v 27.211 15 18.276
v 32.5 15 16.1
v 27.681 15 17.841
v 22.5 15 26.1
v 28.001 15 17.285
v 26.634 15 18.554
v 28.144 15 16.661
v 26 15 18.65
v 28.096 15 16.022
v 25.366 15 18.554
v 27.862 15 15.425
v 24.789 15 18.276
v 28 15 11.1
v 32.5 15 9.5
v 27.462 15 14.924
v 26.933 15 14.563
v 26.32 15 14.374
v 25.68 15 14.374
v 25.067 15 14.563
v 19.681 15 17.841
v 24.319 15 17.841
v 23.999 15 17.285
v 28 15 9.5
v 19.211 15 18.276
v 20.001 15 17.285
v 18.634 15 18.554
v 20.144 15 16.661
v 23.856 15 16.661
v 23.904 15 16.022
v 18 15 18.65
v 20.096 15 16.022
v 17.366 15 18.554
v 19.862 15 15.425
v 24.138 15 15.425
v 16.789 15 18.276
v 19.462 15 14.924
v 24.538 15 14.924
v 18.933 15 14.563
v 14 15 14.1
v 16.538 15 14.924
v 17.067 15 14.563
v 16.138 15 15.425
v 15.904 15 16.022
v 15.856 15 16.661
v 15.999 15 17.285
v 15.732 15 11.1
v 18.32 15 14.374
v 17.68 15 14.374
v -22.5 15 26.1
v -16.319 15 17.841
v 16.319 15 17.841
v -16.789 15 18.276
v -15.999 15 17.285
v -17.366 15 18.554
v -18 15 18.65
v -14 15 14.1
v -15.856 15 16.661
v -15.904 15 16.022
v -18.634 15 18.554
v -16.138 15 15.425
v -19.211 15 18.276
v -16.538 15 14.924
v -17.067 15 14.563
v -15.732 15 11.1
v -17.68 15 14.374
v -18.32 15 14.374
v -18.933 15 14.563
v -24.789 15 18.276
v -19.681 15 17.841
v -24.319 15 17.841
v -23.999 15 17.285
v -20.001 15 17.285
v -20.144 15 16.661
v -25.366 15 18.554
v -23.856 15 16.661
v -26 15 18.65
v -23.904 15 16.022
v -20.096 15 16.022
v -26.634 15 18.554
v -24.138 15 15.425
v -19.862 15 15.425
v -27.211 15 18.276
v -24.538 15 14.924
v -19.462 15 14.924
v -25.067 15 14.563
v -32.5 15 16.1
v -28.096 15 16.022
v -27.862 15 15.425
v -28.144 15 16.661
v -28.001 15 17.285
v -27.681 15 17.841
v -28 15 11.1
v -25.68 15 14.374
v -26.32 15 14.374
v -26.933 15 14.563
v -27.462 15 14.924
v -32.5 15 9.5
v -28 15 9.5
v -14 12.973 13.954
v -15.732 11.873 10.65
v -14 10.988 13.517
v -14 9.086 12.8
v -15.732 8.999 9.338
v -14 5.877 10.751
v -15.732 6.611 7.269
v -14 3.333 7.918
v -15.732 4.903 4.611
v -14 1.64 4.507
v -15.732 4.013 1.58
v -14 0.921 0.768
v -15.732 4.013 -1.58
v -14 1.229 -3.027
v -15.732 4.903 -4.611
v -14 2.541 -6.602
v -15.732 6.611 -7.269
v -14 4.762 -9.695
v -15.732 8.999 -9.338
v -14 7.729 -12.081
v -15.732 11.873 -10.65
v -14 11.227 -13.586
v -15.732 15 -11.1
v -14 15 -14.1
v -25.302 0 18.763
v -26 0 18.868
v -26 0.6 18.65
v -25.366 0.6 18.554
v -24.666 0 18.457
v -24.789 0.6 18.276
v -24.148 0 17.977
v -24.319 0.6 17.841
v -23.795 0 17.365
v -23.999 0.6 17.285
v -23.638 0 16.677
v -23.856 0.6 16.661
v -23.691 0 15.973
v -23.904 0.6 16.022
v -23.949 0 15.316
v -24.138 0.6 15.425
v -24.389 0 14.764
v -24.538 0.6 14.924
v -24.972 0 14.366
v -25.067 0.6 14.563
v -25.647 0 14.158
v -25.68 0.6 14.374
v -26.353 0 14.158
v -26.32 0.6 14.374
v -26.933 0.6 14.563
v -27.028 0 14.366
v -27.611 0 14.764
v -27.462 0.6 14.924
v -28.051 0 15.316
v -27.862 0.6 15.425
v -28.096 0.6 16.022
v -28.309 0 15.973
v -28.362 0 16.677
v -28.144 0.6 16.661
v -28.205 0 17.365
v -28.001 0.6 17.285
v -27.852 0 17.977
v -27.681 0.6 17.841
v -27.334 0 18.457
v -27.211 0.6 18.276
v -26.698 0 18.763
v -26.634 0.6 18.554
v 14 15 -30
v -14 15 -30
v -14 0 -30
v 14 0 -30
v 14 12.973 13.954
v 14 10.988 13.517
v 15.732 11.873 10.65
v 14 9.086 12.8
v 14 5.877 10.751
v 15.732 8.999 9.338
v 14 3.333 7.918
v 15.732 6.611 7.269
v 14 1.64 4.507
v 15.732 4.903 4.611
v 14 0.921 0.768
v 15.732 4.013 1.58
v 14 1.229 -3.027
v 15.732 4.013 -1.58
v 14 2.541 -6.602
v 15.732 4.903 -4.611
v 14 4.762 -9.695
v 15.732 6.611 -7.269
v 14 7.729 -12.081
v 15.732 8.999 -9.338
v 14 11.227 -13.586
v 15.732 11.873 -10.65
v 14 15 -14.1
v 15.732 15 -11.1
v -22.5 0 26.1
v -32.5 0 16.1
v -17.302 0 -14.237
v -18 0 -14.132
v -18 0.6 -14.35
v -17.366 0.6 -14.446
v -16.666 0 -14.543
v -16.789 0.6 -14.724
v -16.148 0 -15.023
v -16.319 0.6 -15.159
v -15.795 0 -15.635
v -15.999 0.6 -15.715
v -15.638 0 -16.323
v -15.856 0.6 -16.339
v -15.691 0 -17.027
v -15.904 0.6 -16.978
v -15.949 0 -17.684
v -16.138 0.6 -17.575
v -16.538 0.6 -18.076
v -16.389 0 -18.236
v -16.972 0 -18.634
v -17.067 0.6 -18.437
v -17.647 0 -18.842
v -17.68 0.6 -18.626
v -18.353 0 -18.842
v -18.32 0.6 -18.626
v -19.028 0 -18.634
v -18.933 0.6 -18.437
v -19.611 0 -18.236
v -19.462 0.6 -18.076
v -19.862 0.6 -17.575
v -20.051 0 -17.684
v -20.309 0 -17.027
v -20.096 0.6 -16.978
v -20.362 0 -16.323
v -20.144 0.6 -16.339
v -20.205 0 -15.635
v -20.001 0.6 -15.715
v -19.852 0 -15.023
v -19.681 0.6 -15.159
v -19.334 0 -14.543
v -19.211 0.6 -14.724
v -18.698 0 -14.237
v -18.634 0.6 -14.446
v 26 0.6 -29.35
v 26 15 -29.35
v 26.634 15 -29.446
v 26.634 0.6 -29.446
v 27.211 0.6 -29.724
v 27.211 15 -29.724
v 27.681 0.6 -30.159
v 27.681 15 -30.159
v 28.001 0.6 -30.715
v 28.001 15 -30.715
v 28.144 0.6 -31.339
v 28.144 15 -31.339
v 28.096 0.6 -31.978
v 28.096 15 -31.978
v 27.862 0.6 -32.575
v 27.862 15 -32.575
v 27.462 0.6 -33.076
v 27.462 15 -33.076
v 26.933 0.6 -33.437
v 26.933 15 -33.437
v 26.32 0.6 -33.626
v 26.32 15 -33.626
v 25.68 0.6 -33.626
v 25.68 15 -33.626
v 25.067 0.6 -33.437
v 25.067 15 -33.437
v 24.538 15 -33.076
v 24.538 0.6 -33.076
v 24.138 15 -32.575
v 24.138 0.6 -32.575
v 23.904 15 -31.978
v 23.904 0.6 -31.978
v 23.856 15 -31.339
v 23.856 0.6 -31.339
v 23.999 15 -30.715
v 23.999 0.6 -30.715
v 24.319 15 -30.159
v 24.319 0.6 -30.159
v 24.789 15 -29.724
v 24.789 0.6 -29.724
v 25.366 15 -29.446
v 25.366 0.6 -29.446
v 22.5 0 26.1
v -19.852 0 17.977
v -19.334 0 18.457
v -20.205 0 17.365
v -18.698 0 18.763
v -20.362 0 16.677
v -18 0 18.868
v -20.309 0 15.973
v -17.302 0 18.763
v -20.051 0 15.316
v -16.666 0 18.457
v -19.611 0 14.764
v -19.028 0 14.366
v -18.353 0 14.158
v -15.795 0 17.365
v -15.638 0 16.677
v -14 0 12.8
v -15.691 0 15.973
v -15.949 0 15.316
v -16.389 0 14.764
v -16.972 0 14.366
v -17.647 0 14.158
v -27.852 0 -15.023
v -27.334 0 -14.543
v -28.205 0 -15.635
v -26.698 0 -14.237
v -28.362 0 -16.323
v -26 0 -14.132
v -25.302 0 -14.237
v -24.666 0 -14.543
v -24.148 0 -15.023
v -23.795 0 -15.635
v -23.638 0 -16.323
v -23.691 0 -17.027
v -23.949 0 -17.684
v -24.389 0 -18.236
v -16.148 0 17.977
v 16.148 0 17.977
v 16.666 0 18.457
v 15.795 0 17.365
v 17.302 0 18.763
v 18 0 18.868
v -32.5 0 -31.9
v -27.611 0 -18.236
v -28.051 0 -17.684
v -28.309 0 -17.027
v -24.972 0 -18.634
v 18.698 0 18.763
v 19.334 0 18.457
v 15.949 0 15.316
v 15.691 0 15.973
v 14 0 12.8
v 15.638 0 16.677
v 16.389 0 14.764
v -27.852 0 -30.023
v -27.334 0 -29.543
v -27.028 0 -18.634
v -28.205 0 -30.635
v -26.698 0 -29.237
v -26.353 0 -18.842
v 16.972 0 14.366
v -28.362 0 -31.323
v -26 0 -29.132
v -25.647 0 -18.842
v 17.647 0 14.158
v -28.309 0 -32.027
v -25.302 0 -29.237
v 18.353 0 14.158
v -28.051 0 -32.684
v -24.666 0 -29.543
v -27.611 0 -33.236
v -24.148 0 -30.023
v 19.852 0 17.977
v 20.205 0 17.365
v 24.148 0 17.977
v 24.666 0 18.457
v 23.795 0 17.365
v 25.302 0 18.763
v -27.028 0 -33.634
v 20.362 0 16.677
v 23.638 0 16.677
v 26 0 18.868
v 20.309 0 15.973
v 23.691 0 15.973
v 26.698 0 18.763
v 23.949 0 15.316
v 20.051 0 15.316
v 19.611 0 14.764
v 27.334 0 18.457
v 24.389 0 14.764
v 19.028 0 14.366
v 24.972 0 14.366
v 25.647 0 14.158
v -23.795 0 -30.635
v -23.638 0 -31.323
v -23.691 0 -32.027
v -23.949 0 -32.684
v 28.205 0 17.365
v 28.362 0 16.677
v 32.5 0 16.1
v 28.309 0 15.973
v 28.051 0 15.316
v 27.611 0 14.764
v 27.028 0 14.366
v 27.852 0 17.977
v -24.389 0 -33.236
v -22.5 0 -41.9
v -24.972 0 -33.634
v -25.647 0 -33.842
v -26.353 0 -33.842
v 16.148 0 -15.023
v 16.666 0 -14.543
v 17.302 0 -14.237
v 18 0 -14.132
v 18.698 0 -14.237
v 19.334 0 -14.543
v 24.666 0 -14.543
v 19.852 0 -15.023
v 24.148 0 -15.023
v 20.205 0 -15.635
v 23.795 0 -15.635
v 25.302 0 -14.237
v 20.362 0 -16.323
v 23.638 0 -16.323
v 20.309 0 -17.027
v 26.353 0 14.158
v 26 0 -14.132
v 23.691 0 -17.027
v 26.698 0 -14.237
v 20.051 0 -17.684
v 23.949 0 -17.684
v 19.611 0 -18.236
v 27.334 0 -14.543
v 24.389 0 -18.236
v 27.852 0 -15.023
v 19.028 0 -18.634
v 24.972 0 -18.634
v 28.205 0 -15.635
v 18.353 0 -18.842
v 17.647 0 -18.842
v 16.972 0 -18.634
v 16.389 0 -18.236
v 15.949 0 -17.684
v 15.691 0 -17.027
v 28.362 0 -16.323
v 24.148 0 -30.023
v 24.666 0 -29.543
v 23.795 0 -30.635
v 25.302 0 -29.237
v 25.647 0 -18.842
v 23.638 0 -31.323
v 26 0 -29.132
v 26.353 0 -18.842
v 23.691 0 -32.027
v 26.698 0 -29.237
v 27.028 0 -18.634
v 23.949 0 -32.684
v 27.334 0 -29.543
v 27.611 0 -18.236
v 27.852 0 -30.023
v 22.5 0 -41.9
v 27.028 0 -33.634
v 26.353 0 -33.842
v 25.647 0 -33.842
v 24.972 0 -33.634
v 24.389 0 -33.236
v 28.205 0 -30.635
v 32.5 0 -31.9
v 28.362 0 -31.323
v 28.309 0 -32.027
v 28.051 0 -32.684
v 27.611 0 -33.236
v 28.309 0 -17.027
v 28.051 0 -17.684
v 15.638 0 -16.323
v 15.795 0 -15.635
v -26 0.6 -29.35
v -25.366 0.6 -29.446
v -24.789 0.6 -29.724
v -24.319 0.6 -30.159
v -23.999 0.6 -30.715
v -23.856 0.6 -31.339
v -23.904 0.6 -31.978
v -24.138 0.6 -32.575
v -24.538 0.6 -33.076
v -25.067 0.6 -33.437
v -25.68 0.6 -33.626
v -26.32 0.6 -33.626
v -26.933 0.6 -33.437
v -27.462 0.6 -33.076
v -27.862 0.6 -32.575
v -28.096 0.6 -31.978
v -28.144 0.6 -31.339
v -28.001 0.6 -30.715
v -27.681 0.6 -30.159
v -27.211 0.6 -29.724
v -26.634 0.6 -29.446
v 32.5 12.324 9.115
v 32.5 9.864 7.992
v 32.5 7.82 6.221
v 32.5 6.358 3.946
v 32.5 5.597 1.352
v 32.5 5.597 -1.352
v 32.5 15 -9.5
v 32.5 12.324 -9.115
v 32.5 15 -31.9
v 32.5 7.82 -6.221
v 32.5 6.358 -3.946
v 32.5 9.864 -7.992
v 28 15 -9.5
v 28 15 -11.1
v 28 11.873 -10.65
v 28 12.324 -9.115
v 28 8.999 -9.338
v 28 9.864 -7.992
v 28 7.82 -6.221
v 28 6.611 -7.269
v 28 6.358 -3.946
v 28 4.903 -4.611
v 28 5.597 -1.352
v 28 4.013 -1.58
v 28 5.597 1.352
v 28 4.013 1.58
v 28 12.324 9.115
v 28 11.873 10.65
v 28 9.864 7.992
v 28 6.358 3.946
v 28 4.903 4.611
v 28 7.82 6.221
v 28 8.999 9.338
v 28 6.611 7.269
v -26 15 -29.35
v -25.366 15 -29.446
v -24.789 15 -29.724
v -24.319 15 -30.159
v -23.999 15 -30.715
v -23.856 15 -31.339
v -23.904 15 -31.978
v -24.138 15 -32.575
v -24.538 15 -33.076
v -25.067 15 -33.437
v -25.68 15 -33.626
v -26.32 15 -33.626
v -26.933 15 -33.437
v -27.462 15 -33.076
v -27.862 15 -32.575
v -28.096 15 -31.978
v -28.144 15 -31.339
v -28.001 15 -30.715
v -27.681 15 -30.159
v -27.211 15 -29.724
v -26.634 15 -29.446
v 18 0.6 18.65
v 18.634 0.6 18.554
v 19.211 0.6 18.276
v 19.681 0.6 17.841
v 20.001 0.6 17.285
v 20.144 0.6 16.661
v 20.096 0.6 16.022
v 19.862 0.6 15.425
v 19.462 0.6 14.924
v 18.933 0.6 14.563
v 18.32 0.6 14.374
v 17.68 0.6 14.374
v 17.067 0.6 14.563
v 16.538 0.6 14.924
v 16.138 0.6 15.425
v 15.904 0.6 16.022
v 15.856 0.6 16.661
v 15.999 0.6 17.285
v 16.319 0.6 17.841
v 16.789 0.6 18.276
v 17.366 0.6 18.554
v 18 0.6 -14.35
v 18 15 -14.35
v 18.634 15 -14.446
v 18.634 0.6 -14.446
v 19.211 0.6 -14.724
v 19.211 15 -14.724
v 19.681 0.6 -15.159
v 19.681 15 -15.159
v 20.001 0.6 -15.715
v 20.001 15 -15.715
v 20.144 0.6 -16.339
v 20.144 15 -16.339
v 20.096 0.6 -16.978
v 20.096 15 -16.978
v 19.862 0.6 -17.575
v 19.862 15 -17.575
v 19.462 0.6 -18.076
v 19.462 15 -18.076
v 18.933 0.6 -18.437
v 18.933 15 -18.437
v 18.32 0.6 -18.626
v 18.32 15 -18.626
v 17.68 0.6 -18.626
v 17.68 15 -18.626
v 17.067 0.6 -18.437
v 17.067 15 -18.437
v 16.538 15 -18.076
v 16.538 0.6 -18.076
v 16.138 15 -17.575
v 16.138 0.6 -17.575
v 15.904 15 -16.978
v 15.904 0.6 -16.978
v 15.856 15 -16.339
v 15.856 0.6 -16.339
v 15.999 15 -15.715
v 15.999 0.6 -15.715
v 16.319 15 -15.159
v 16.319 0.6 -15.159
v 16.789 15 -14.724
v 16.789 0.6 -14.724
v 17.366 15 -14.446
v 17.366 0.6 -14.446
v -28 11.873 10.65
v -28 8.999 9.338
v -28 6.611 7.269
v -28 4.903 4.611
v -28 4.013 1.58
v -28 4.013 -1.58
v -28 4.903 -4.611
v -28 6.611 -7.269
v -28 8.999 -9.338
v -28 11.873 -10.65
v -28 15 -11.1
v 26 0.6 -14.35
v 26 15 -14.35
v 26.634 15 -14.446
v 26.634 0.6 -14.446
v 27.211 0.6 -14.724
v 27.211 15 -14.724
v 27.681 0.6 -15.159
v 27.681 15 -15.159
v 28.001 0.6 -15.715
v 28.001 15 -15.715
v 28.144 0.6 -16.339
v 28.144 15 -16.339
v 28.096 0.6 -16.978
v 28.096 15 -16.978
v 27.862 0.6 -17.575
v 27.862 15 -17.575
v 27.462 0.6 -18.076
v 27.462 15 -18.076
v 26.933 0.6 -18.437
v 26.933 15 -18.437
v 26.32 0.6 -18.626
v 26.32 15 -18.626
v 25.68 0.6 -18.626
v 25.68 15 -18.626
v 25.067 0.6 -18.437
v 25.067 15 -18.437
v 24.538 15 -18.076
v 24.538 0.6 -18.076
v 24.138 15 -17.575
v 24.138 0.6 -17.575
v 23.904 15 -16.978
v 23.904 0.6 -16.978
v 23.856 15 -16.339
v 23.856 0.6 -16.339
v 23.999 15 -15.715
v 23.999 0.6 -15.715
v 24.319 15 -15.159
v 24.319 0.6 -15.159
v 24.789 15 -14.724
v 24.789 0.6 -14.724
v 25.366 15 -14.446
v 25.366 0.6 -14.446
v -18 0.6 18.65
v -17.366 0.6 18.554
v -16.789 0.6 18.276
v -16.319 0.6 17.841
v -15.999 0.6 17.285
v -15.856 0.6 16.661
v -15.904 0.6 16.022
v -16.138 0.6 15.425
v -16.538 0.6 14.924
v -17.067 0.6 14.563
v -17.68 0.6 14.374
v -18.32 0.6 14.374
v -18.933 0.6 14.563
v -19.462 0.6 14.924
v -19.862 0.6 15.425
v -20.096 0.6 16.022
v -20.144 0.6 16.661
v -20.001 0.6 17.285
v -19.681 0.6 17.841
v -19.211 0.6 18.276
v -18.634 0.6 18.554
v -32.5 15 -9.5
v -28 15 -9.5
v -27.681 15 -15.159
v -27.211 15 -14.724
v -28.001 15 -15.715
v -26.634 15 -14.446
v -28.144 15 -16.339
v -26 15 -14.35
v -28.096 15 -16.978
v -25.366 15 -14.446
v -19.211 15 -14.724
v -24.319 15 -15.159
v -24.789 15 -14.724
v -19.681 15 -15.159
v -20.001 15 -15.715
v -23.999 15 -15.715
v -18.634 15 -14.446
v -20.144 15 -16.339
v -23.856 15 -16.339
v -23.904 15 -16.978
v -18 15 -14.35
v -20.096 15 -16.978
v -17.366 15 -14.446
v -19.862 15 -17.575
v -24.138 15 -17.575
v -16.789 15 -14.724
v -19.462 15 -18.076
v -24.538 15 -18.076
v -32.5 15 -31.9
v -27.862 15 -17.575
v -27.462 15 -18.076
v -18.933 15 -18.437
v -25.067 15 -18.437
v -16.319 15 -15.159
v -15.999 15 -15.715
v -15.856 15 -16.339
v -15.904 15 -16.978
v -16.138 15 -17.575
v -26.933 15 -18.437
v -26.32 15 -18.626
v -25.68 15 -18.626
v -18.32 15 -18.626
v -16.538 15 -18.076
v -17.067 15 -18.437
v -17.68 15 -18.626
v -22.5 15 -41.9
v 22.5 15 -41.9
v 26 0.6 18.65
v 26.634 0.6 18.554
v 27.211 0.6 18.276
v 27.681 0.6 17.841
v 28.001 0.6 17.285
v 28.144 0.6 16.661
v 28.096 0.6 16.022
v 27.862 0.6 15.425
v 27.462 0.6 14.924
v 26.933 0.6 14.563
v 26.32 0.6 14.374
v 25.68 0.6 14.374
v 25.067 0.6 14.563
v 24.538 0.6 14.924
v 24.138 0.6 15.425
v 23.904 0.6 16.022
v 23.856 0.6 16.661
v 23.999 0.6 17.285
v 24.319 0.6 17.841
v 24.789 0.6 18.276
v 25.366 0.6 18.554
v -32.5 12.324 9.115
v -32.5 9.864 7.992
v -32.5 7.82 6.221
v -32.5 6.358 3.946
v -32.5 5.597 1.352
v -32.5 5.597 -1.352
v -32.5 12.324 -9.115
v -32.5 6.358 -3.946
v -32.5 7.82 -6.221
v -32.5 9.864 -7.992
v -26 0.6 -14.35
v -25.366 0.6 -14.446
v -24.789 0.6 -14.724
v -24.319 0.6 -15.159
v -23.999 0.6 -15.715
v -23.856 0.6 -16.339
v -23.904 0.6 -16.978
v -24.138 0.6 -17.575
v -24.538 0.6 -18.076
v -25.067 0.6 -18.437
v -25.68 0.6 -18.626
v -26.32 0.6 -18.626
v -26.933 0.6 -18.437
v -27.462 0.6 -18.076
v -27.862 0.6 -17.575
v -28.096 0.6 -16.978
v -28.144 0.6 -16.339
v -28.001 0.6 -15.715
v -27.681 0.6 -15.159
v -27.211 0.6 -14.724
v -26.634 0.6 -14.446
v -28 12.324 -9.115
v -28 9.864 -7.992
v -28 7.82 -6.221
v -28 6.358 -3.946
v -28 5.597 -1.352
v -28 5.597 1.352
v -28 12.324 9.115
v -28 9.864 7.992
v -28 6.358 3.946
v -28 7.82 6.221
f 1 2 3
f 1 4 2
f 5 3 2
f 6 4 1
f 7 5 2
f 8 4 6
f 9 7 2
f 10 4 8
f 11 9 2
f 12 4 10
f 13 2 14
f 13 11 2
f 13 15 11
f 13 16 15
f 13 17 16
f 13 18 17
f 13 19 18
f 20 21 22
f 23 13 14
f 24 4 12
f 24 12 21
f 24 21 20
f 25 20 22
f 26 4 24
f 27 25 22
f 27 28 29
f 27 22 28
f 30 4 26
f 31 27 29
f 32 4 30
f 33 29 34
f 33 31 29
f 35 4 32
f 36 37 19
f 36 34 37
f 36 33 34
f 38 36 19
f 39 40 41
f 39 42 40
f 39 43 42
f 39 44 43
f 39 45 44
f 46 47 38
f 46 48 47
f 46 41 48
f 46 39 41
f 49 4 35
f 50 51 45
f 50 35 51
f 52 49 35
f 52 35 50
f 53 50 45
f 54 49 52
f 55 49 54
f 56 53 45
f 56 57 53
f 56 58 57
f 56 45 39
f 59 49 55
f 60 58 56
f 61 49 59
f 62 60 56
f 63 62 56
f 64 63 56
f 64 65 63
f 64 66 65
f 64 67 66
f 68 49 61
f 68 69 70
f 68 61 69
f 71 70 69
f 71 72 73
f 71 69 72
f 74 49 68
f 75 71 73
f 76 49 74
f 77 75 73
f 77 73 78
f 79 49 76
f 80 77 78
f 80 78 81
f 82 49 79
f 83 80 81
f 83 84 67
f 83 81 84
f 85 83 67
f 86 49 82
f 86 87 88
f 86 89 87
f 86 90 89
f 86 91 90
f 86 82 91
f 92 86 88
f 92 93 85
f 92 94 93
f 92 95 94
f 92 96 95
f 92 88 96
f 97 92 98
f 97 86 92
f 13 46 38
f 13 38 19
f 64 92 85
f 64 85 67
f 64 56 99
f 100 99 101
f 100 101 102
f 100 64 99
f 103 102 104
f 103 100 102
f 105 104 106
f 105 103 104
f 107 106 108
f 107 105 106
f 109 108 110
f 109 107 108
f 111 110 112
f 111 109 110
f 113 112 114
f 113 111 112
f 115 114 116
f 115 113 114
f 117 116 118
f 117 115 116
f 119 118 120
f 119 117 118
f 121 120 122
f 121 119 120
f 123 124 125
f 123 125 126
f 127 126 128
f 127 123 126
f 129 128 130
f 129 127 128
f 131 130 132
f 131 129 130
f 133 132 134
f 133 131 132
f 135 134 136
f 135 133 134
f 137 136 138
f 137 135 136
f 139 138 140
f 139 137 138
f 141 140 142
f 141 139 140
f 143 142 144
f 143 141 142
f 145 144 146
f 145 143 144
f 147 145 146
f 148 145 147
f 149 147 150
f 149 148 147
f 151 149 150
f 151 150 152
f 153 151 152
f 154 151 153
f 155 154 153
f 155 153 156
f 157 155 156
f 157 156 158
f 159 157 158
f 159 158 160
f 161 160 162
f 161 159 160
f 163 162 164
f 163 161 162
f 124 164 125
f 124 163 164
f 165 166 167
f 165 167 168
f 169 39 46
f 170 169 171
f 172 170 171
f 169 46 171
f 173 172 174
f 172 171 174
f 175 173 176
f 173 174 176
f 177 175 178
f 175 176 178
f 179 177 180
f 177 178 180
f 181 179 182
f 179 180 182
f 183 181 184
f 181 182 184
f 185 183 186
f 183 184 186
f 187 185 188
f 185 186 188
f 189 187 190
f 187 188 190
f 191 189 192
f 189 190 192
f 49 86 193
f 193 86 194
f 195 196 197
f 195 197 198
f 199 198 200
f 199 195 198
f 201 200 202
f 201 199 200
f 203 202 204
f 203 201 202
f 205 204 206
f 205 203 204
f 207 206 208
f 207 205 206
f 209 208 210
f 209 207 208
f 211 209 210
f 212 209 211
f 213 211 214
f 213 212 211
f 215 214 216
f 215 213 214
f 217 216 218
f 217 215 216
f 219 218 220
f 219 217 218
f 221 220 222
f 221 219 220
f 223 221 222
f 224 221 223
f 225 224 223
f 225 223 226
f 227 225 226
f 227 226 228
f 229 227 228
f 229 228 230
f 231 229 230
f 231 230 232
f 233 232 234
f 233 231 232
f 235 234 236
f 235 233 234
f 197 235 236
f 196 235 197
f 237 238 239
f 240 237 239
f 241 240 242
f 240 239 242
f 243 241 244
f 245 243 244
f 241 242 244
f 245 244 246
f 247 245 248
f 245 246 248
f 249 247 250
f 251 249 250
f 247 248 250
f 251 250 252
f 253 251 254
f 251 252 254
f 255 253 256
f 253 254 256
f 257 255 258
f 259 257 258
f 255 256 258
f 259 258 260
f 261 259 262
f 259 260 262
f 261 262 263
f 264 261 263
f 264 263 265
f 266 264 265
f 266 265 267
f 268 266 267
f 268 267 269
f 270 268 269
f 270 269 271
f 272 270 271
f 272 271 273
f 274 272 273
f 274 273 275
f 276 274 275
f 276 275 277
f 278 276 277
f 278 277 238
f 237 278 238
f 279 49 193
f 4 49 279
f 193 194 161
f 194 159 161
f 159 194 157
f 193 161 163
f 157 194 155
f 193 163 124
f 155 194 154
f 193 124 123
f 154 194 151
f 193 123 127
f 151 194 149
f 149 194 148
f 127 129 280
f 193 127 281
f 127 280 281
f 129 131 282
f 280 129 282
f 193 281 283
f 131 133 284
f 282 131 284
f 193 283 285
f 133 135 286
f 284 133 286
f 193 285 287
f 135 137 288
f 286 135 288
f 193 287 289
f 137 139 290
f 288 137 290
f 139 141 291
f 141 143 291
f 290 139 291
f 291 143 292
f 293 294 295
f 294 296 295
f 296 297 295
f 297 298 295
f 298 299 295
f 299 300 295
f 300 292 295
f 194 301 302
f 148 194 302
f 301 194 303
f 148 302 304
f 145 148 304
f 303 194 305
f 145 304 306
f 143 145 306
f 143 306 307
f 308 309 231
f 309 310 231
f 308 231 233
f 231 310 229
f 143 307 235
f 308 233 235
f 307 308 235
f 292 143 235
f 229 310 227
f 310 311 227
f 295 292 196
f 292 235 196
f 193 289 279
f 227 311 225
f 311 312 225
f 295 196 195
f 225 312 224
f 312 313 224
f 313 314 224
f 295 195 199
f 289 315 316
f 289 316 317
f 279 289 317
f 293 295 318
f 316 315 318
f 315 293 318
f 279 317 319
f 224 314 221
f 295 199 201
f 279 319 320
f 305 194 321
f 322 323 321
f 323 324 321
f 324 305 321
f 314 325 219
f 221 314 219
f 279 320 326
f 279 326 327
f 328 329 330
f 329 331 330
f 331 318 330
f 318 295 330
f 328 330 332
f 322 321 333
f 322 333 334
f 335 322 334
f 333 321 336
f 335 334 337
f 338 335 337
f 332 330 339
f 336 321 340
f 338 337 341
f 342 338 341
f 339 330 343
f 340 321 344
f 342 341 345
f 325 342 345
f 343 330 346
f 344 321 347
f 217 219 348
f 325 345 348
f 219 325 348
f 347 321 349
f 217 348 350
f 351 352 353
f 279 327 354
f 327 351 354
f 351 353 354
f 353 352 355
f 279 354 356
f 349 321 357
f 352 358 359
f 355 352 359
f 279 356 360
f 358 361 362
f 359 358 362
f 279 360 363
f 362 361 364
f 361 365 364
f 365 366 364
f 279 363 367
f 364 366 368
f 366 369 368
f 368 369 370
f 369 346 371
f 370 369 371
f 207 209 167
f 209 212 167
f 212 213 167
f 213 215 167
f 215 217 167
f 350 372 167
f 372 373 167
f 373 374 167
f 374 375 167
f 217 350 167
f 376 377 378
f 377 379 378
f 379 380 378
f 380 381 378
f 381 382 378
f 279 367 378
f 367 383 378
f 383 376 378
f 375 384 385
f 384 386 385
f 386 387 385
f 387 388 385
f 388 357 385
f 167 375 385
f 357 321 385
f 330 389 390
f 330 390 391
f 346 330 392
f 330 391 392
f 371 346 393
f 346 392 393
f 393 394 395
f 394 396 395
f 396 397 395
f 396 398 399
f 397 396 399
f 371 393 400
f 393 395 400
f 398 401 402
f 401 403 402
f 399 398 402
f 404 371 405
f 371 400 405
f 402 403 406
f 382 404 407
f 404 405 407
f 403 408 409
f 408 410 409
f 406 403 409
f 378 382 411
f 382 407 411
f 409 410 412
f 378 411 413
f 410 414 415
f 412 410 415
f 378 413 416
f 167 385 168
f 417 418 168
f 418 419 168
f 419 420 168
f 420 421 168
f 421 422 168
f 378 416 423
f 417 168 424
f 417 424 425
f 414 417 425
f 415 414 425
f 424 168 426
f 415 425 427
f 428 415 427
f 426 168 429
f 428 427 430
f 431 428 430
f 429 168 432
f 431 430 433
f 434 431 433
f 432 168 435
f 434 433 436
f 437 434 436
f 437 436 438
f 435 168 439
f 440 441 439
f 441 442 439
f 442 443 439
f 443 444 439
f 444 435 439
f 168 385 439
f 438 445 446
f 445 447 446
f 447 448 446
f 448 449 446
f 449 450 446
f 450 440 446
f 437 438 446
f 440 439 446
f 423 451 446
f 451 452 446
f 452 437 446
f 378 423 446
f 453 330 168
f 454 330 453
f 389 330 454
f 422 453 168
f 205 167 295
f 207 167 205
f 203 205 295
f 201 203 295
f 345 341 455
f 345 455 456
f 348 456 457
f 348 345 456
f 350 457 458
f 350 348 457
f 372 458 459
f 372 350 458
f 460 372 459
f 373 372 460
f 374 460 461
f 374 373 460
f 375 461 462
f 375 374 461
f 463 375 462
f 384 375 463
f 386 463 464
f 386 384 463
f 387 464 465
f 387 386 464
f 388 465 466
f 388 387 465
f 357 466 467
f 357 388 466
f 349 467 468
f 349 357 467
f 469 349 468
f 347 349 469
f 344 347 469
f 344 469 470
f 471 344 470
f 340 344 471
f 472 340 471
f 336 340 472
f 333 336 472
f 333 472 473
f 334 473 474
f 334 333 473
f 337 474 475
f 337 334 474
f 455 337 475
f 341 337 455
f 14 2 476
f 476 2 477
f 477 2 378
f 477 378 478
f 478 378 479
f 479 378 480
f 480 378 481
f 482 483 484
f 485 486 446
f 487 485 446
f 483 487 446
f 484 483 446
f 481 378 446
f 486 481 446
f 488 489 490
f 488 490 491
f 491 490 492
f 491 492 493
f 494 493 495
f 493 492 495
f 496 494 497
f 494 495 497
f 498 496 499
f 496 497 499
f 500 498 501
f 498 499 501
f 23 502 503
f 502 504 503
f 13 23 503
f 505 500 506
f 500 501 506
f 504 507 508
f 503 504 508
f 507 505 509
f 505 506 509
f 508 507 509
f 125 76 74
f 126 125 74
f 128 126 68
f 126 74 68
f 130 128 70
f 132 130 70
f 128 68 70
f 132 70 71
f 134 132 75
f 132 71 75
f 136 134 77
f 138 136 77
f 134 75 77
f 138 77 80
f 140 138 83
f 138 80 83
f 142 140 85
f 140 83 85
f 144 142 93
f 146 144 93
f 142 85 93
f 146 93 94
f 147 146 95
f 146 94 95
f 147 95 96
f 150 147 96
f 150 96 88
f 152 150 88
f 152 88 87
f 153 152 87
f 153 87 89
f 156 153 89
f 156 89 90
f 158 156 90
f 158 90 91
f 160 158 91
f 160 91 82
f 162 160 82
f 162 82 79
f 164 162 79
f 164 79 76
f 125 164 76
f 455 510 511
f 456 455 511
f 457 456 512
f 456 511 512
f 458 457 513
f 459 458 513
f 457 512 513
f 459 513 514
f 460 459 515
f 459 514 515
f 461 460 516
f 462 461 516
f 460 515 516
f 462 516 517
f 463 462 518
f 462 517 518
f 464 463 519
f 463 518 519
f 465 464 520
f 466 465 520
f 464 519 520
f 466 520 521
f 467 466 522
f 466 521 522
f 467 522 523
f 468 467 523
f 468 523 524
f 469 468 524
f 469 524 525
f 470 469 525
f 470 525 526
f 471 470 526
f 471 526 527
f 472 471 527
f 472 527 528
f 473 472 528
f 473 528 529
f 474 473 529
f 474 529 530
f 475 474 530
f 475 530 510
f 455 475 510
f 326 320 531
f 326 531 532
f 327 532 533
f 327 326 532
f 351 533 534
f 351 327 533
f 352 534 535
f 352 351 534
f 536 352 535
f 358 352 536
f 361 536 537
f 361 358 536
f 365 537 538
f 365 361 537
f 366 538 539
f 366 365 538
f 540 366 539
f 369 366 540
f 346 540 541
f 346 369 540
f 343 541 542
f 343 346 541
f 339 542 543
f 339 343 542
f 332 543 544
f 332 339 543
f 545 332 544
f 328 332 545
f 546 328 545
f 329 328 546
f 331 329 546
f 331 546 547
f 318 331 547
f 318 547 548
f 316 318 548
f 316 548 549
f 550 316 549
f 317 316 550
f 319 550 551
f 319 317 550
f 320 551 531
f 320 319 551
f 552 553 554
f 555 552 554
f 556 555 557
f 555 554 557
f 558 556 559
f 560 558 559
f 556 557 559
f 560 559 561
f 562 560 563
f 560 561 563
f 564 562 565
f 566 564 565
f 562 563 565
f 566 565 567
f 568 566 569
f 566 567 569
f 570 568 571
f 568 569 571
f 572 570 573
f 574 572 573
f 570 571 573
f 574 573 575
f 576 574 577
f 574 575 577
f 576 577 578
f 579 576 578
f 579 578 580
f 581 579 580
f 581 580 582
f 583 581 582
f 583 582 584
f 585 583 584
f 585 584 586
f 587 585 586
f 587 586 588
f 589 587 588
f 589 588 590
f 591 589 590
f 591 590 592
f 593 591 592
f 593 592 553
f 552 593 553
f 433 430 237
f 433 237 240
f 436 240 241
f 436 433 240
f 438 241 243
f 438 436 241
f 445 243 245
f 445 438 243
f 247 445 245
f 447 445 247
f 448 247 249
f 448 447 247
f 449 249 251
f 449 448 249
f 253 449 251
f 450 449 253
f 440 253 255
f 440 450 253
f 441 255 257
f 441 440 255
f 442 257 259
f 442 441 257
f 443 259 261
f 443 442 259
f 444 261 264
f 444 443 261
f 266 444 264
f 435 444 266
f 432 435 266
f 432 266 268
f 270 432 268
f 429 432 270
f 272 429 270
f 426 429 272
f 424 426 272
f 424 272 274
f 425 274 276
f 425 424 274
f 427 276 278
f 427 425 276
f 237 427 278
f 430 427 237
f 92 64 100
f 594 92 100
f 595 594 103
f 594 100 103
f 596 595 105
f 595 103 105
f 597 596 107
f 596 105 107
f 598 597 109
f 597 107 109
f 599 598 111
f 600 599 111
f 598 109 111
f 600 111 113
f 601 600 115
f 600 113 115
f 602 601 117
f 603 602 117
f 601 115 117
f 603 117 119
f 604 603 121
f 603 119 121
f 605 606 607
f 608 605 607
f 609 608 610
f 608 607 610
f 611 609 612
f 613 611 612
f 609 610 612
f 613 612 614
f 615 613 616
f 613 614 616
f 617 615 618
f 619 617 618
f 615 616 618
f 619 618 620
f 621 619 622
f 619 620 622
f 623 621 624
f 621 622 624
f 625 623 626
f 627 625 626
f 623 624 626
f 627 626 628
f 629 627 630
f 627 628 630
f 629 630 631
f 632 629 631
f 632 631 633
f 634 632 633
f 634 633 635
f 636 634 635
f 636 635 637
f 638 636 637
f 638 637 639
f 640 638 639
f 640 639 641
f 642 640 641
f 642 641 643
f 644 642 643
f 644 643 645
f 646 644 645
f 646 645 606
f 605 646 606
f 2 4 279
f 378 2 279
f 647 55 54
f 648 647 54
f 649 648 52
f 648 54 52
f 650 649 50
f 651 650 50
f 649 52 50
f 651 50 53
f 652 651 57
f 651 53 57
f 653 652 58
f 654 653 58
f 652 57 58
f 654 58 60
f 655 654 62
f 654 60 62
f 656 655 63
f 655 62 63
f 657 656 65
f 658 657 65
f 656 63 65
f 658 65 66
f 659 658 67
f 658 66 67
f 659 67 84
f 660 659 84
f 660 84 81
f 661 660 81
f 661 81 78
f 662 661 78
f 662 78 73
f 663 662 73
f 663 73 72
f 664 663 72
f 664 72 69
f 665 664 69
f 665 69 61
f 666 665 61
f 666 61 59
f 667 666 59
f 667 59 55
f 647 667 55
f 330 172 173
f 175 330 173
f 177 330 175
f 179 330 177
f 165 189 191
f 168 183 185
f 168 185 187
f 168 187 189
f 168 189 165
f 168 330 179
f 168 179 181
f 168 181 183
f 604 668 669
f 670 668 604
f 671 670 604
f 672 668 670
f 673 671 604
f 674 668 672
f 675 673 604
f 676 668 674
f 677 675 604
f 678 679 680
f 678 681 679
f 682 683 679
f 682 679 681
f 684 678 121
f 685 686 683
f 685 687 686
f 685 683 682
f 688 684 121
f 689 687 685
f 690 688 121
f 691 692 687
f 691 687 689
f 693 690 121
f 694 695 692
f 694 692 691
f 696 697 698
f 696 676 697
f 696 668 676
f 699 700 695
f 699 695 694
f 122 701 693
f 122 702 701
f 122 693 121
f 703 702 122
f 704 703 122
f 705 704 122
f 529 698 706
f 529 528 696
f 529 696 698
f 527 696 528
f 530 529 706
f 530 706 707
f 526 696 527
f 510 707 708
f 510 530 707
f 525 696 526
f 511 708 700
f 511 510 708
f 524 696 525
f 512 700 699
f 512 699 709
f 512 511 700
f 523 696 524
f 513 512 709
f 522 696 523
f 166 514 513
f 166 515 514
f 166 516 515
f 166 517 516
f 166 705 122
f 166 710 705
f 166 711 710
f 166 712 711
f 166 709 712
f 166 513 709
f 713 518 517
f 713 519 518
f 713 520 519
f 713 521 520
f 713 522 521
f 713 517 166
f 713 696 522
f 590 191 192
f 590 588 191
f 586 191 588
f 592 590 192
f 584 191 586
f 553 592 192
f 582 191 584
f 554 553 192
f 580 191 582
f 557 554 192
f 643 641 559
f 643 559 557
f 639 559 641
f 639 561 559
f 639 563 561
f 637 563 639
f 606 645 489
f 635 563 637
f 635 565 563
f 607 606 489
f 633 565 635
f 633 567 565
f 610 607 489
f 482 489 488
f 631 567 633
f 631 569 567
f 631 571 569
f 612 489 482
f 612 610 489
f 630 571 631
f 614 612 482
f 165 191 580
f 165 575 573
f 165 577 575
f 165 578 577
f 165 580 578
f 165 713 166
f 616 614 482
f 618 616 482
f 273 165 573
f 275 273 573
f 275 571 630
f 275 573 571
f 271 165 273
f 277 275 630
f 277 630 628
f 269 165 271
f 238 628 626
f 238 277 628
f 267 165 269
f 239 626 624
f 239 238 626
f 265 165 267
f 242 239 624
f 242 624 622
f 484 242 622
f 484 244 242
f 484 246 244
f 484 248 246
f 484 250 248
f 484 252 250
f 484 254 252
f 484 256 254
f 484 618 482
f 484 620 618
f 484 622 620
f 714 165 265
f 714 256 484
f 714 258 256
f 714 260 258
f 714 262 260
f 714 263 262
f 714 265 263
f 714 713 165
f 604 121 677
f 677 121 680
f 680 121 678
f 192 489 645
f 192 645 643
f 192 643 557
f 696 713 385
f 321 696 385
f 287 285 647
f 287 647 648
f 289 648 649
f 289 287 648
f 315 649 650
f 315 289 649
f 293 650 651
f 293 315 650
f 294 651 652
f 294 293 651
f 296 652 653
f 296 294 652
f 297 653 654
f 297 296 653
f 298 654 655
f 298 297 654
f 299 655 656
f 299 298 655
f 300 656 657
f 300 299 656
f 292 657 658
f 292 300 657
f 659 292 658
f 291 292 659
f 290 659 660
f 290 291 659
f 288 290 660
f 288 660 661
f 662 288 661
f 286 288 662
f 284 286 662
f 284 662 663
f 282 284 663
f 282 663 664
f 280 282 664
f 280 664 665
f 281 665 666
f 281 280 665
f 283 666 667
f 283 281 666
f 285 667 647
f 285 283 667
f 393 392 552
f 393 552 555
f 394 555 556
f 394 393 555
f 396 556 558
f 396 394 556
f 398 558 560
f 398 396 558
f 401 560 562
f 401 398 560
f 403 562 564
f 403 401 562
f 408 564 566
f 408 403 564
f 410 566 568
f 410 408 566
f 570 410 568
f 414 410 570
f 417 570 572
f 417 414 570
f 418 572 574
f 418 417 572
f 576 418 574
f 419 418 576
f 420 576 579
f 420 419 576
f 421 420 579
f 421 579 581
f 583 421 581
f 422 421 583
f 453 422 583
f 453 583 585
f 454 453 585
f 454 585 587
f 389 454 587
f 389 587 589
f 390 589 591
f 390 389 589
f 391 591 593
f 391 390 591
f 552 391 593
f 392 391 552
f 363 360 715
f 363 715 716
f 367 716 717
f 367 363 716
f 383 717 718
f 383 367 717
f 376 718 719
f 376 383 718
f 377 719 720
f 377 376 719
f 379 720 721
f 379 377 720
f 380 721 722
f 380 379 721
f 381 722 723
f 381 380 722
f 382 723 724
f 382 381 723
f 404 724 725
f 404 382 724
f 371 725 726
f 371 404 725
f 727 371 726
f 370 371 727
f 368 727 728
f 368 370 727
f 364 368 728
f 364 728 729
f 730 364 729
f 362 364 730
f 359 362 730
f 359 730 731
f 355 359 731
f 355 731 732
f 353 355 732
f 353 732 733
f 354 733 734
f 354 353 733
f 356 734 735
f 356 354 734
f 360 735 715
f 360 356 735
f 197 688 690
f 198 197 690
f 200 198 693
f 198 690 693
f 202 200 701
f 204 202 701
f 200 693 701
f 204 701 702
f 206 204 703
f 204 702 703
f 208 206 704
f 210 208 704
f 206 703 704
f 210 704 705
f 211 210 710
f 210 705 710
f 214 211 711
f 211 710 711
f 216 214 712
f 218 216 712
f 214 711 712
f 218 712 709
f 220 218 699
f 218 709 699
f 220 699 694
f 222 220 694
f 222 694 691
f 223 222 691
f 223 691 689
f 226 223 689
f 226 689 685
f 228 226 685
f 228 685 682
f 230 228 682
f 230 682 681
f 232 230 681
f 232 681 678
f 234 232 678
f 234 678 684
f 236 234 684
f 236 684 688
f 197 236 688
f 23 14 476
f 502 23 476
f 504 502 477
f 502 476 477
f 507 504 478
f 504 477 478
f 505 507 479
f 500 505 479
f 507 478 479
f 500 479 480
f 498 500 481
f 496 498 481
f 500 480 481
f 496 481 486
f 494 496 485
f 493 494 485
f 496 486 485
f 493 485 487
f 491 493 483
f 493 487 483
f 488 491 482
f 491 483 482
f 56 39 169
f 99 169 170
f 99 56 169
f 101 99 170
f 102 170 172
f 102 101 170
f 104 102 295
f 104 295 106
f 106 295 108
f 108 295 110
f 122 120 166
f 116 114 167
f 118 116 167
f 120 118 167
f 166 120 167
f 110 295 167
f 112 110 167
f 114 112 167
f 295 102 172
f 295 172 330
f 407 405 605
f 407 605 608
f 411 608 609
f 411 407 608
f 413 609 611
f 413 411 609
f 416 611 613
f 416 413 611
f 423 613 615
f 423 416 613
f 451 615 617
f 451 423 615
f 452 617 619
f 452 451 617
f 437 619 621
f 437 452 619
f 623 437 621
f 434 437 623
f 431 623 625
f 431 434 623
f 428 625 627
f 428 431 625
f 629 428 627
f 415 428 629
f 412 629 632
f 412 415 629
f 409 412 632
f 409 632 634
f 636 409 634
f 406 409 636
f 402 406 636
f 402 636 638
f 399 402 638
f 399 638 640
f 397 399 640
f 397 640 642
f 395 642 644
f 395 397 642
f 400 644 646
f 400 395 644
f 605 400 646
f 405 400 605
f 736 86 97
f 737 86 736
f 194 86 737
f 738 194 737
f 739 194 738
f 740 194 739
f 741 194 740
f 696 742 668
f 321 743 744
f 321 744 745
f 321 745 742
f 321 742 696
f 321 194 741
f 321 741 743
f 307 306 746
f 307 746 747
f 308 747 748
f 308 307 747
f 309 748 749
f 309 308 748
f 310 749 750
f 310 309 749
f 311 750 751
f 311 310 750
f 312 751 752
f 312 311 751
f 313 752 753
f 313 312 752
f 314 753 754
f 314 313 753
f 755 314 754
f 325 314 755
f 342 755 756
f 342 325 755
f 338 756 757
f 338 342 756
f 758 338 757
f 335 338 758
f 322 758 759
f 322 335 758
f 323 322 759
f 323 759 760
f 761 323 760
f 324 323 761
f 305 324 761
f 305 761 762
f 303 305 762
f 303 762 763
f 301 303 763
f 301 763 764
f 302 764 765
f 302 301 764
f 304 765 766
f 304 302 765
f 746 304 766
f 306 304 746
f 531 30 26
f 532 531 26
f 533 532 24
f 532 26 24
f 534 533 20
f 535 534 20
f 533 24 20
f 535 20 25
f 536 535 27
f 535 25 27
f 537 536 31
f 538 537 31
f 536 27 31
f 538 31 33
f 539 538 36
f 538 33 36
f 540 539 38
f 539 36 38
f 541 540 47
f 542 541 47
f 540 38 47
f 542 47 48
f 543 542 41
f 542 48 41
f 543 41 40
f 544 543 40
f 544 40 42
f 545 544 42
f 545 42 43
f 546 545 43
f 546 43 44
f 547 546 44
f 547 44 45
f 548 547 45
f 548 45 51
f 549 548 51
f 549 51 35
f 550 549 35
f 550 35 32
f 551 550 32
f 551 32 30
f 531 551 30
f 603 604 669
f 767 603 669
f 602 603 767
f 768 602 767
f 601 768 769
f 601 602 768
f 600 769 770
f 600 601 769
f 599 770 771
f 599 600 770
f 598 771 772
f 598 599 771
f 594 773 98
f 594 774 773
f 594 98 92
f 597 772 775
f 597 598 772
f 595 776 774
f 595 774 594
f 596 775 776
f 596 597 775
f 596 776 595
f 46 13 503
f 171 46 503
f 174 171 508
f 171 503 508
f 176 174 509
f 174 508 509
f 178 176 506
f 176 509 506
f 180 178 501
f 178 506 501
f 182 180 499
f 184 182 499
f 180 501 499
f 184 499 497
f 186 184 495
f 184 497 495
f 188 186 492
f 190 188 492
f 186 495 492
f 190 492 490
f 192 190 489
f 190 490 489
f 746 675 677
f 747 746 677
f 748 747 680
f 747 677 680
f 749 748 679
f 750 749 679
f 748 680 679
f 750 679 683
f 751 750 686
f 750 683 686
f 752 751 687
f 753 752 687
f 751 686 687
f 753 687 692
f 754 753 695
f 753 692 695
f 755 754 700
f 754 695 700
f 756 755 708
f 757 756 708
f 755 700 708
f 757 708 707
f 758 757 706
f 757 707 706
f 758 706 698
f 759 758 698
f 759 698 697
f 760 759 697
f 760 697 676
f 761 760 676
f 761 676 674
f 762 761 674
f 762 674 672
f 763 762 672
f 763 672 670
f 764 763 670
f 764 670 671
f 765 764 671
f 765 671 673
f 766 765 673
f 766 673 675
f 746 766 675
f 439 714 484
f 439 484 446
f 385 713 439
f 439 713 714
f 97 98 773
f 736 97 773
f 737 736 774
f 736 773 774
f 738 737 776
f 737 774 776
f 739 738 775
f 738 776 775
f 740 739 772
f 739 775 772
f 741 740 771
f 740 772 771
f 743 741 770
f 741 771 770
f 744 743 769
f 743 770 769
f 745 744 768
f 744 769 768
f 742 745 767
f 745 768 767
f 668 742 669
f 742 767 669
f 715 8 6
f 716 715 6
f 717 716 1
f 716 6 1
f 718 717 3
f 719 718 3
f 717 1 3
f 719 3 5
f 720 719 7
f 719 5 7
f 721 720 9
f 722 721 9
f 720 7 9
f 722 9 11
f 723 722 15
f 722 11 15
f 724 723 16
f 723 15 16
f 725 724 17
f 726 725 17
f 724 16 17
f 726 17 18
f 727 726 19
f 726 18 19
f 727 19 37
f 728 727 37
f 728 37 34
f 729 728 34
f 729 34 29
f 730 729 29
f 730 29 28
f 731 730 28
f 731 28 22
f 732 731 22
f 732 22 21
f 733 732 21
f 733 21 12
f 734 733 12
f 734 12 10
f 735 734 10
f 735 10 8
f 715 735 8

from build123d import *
from OCP.BRepFilletAPI import BRepFilletAPI_MakeChamfer

# Parameters (mm, degrees)
SKETCH1_W                = 65
SKETCH1_H                = 100
SKETCH1_W_2              = 28
SKETCH1_H_2              = 80
BOSS_EXTRUDE1_DEPTH      = 15
SKETCH3_W                = 14
SKETCH3_H                = 11.1
SKETCH4_R                = 9.5
CUT_EXTRUDE2_DEPTH       = 84.366660003
SKETCH8_R                = 2.15
CUT_EXTRUDE6_DEPTH       = 62.491869381
FILLET1_R                = 20
CHAMFER1_SIZE            = 3
CHAMFER1_SIZE2           = 1.732050808
SKETCH10_W               = 30
SKETCH10_H               = 5.5
BOSS_EXTRUDE2_DEPTH      = 20
BOSS_EXTRUDE3_START      = 13
SKETCH12_W               = 30
SKETCH12_H               = 3.7
BOSS_EXTRUDE3_DEPTH      = 7
BOSS_EXTRUDE4_DEPTH      = 1.3
CHAMFER3_SIZE            = 10
CHAMFER3_SIZE2           = 5.773502692
BOSS_EXTRUDE6_DEPTH      = 28
SKETCH16_W               = 65
SKETCH16_H               = 26.184127578
CUT_EXTRUDE7_DEPTH       = 75.035464475
SKETCH17_W               = 28
SKETCH17_H               = 10
BOSS_EXTRUDE7_DEPTH      = 15
SKETCH18_W               = 65
SKETCH18_H               = 20
BOSS_EXTRUDE8_DEPTH      = 15
SKETCH19_W               = 65
SKETCH19_H               = 8.1
CUT_EXTRUDE8_DEPTH       = 75.035464475
CHAMFER4_SIZE2           = 2.438662943
CHAMFER4_SIZE            = 5
CUT_EXTRUDE10_DEPTH      = 3
CHAMFER5_SIZE            = 10
SKETCH26_R               = 2.15
CUT_EXTRUDE11_DEPTH      = 69.824850163
CUT_EXTRUDE12_DEPTH      = 68.838853174
CUT_EXTRUDE12_DEPTH_BACK = 68.838853174
CHAMFER6_SIZE            = 0.6
CHAMFER6_SIZE2           = 0.218382141


with BuildPart() as part:
    # Sketch1 → Boss-Extrude1 (new body)
    with BuildSketch(Plane(origin=(0, 0, 0), x_dir=(1, 0, 0), z_dir=(0, 1, 0))):
        Rectangle(SKETCH1_W, SKETCH1_H)
        Rectangle(SKETCH1_W_2, SKETCH1_H_2, mode=Mode.SUBTRACT)
    extrude(amount=BOSS_EXTRUDE1_DEPTH)

    # Sketch3 → Cut-Revolve1 (revolve, cut)
    with BuildSketch(Plane(origin=(0, 15, 0), x_dir=(1, 0, 0), z_dir=(0, 1, 0))):
        with Locations((21, -5.55)):
            Rectangle(SKETCH3_W, SKETCH3_H)
        with Locations((-21, -5.55)):
            Rectangle(SKETCH3_W, SKETCH3_H)
    revolve(axis=Axis((14, 15, 0), (1, 0, 0)), mode=Mode.SUBTRACT)

    # Sketch4 → Cut-Extrude2 (cut, through all)
    with BuildSketch(Plane(origin=(32.5, 0, 0), x_dir=(0, 0, -1), z_dir=(1, 0, 0))):
        with Locations((0, 15)):
            Circle(SKETCH4_R)
    extrude(amount=-CUT_EXTRUDE2_DEPTH, mode=Mode.SUBTRACT)

    # Sketch8 → Cut-Extrude6 (cut, through all)
    with BuildSketch(Plane(origin=(0, 15, 0), x_dir=(1, 0, 0), z_dir=(0, 1, 0))):
        with Locations(Location((18, 16.5, 0), (0, 0, 270))):
            Circle(SKETCH8_R)
        with Locations(Location((18, -16.5, 0), (0, 0, 270))):
            Circle(SKETCH8_R)
        with Locations(Location((-18, -16.5, 0), (0, 0, 270))):
            Circle(SKETCH8_R)
        with Locations(Location((-18, 16.5, 0), (0, 0, 270))):
            Circle(SKETCH8_R)
        with Locations((9, -27)):
            Circle(SKETCH8_R)
        with Locations((-9, -27)):
            Circle(SKETCH8_R)
        with Locations((-9, 27)):
            Circle(SKETCH8_R)
        with Locations((9, 27)):
            Circle(SKETCH8_R)
        with Locations(Location((-26, 16.5, 0), (0, 0, 270))):
            Circle(SKETCH8_R)
        with Locations(Location((26, 16.5, 0), (0, 0, 270))):
            Circle(SKETCH8_R)
        with Locations(Location((26, -16.5, 0), (0, 0, 270))):
            Circle(SKETCH8_R)
        with Locations(Location((-26, -16.5, 0), (0, 0, 270))):
            Circle(SKETCH8_R)
    extrude(amount=-CUT_EXTRUDE6_DEPTH, mode=Mode.SUBTRACT)

    # Fillet1
    fillet1_edges = [part.edges().sort_by_distance(p)[0] for p in [
        (-32.5, 7.5, -50),
        (32.5, 7.5, -50),
        (32.5, 7.5, 50),
        (-32.5, 7.5, 50),
    ]]
    fillet(fillet1_edges, radius=FILLET1_R)

    # Chamfer1: one chamfer whose edges measure the first distance from different faces: ONE call of the kernel's chamfer builder (chamfer() names one face for all edges)
    chamfer1_edges_1 = [part.edges().sort_by_distance(p)[0] for p in [
        (14, 3.9, 0),
    ]]
    chamfer1_side_1 = [part.faces().sort_by_distance(p)[0] for p in [
        (14, 0.81394103, 0),
    ]]
    chamfer1_edges_2 = [part.edges().sort_by_distance(p)[0] for p in [
        (-14, 3.9, 0),
    ]]
    chamfer1_side_2 = [part.faces().sort_by_distance(p)[0] for p in [
        (-14, 0.81394103, 0),
    ]]
    chamfer1 = BRepFilletAPI_MakeChamfer(part.part.solid().wrapped)
    for e in chamfer1_edges_1:
        chamfer1.Add(CHAMFER1_SIZE, CHAMFER1_SIZE2, e.wrapped, chamfer1_side_1[0].wrapped)  # the first distance lies on this face
    for e in chamfer1_edges_2:
        chamfer1.Add(CHAMFER1_SIZE, CHAMFER1_SIZE2, e.wrapped, chamfer1_side_2[0].wrapped)  # the first distance lies on this face
    add(Compound.cast(chamfer1.Shape()), mode=Mode.REPLACE)

    # Sketch10 → Boss-Extrude2 (add)
    with BuildSketch(Plane.ZY.offset(32.5)):
        with Locations((0, 2.75)):
            Rectangle(SKETCH10_W, SKETCH10_H)
    extrude(amount=BOSS_EXTRUDE2_DEPTH)

    # Sketch12 → Boss-Extrude3 (add)
    with BuildSketch(Plane.ZY.offset(32.5).offset(BOSS_EXTRUDE3_START)):
        with Locations((0, 7.35)):
            Rectangle(SKETCH12_W, SKETCH12_H)
    extrude(amount=BOSS_EXTRUDE3_DEPTH)

    # Sketch13 → Boss-Extrude4 (add)
    with BuildSketch(Plane(origin=(0, 9.2, 0), x_dir=(1, 0, 0), z_dir=(0, 1, 0))):
        Polygon((-51.4, 2.2), (-51.4, 1.6), (-52.5, 1.6), (-52.5, 15), (-45.5, 15), (-45.5, -15), (-52.5, -15), (-52.5, -1.6), (-51.4, -1.6), (-51.4, -2.2), (-48.2, -2.2), (-48.2, 2.2), align=None)
    extrude(amount=BOSS_EXTRUDE4_DEPTH)

    # Chamfer3: one chamfer whose edges measure the first distance from different faces: ONE call of the kernel's chamfer builder (chamfer() names one face for all edges)
    chamfer3_edges_1 = [part.edges().sort_by_distance(p)[0] for p in [
        (-52.5, 5.25, -15),
    ]]
    chamfer3_side_1 = [part.faces().sort_by_distance(p)[0] for p in [
        (-44.068965517, 4.017241379, -15),
    ]]
    chamfer3_edges_2 = [part.edges().sort_by_distance(p)[0] for p in [
        (-52.5, 5.25, 15),
    ]]
    chamfer3_side_2 = [part.faces().sort_by_distance(p)[0] for p in [
        (-44.068965517, 4.017241379, 15),
    ]]
    chamfer3 = BRepFilletAPI_MakeChamfer(part.part.solid().wrapped)
    for e in chamfer3_edges_1:
        chamfer3.Add(CHAMFER3_SIZE, CHAMFER3_SIZE2, e.wrapped, chamfer3_side_1[0].wrapped)  # the first distance lies on this face
    for e in chamfer3_edges_2:
        chamfer3.Add(CHAMFER3_SIZE, CHAMFER3_SIZE2, e.wrapped, chamfer3_side_2[0].wrapped)  # the first distance lies on this face
    add(Compound.cast(chamfer3.Shape()), mode=Mode.REPLACE)

    # Sketch15 → Boss-Extrude6 (add)
    with BuildSketch(Plane(origin=(-14, 0, 0), x_dir=(0, 0, -1), z_dir=(1, 0, 0))):
        with BuildLine():
            Line((-12.8, 9.086456223), (-12.8, 0))
            Line((-12.8, 0), (-40, 0))
            Line((-40, 0), (-40, 15))
            Line((-40, 15), (-14.1, 15))
            ThreePointArc((-14.1, 15), (-13.771165528, 11.972624899), (-12.8, 9.086456223))
        make_face()
    extrude(amount=BOSS_EXTRUDE6_DEPTH)

    # Sketch16 → Cut-Extrude7 (cut, through all)
    with BuildSketch(Plane(origin=(0, 15, 0), x_dir=(1, 0, 0), z_dir=(0, 1, 0))):
        with Locations((0, -39.192063789)):
            Rectangle(SKETCH16_W, SKETCH16_H)
    extrude(amount=-CUT_EXTRUDE7_DEPTH, mode=Mode.SUBTRACT)

    # Sketch17 → Boss-Extrude7 (add)
    with BuildSketch(Plane(origin=(0, 15, 0), x_dir=(1, 0, 0), z_dir=(0, 1, 0))):
        with Locations((0, 35)):
            Rectangle(SKETCH17_W, SKETCH17_H)
    extrude(amount=-BOSS_EXTRUDE7_DEPTH)

    # Sketch18 → Boss-Extrude8 (add)
    with BuildSketch(Plane(origin=(0, 15, 0), x_dir=(1, 0, 0), z_dir=(0, 1, 0))):
        with Locations((0, 40)):
            Rectangle(SKETCH18_W, SKETCH18_H)
    extrude(amount=-BOSS_EXTRUDE8_DEPTH)

    # Sketch19 → Cut-Extrude8 (cut, through all)
    with BuildSketch(Plane(origin=(0, 15, 0), x_dir=(1, 0, 0), z_dir=(0, 1, 0))):
        with Locations((0, 45.95)):
            Rectangle(SKETCH19_W, SKETCH19_H)
    extrude(amount=-CUT_EXTRUDE8_DEPTH, mode=Mode.SUBTRACT)

    # Chamfer4
    chamfer4_edges = [part.edges().sort_by_distance(p)[0] for p in [
        (-45.5, 10.5, 0),
    ]]
    chamfer4_side = [part.faces().sort_by_distance(p)[0] for p in [
        (-45.5, 10.451226741, 0),
    ]]
    chamfer(chamfer4_edges, length=CHAMFER4_SIZE - 0.0001, length2=CHAMFER4_SIZE2 - 0.0001, reference=chamfer4_side[0])  # a hair under: the kernel refuses the full size

    # Sketch21 → Cut-Extrude10 (cut)
    with BuildSketch(Plane.XZ):
        Polygon((-32.5, -5), (-32.5, 15), (-42.5, 15), (-42.5, 5), (-52.5, 5), (-52.5, -5), align=None)
    extrude(amount=-CUT_EXTRUDE10_DEPTH, mode=Mode.SUBTRACT)

    # Chamfer5
    chamfer5_edges = [part.edges().sort_by_distance(p)[0] for p in [
        (-32.5, 7.5, 26.1),
        (32.5, 7.5, 26.1),
        (32.5, 7.5, -41.9),
        (-32.5, 7.5, -41.9),
    ]]
    chamfer(chamfer5_edges, length=CHAMFER5_SIZE)

    # Sketch26 → Cut-Extrude11 (cut, through all)
    with BuildSketch(Plane(origin=(0, 15, 0), x_dir=(1, 0, 0), z_dir=(0, 1, 0))):
        with Locations(Location((-26, 31.5, 0), (0, 0, 270))):
            Circle(SKETCH26_R)
        with Locations(Location((26, 31.5, 0), (0, 0, 270))):
            Circle(SKETCH26_R)
    extrude(amount=-CUT_EXTRUDE11_DEPTH, mode=Mode.SUBTRACT)

    # Sketch27 → Cut-Extrude12 (cut, two sides: drawn at the far end of the back side and taken through both)
    with BuildSketch(Plane(origin=(0, 5.5, 0), x_dir=(1, 0, 0), z_dir=(0, 1, 0)).offset(-CUT_EXTRUDE12_DEPTH_BACK)):
        Polygon((-32.5, 15), (-61.168127917, 15), (-61.168127917, -18.062525398), (-32.5, -15), align=None)
    extrude(amount=CUT_EXTRUDE12_DEPTH + CUT_EXTRUDE12_DEPTH_BACK, mode=Mode.SUBTRACT)

    # Chamfer6: one chamfer whose edges measure the first distance from different faces: ONE call of the kernel's chamfer builder (chamfer() names one face for all edges)
    chamfer6_edges_1 = [part.edges().sort_by_distance(p)[0] for p in [
        (-26, 0, -33.65),
    ]]
    chamfer6_side_1 = [part.faces().sort_by_distance(p)[0] for p in [
        (-26, 7.5, -33.65),
    ]]
    chamfer6_edges_2 = [part.edges().sort_by_distance(p)[0] for p in [
        (26, 0, -33.65),
    ]]
    chamfer6_side_2 = [part.faces().sort_by_distance(p)[0] for p in [
        (26, 7.5, -33.65),
    ]]
    chamfer6_edges_3 = [part.edges().sort_by_distance(p)[0] for p in [
        (18, 0, -18.65),
    ]]
    chamfer6_side_3 = [part.faces().sort_by_distance(p)[0] for p in [
        (18, 7.5, -18.65),
    ]]
    chamfer6_edges_4 = [part.edges().sort_by_distance(p)[0] for p in [
        (26, 0, -18.65),
    ]]
    chamfer6_side_4 = [part.faces().sort_by_distance(p)[0] for p in [
        (26, 7.5, -18.65),
    ]]
    chamfer6_edges_5 = [part.edges().sort_by_distance(p)[0] for p in [
        (26, 0, 14.35),
    ]]
    chamfer6_side_5 = [part.faces().sort_by_distance(p)[0] for p in [
        (26, 7.5, 14.35),
    ]]
    chamfer6_edges_6 = [part.edges().sort_by_distance(p)[0] for p in [
        (-26, 0, 14.35),
    ]]
    chamfer6_side_6 = [part.faces().sort_by_distance(p)[0] for p in [
        (-26, 7.5, 14.35),
    ]]
    chamfer6_edges_7 = [part.edges().sort_by_distance(p)[0] for p in [
        (18, 0, 14.35),
    ]]
    chamfer6_side_7 = [part.faces().sort_by_distance(p)[0] for p in [
        (18, 7.5, 14.35),
    ]]
    chamfer6_edges_8 = [part.edges().sort_by_distance(p)[0] for p in [
        (-18, 0, 14.35),
    ]]
    chamfer6_side_8 = [part.faces().sort_by_distance(p)[0] for p in [
        (-18, 7.5, 14.35),
    ]]
    chamfer6_edges_9 = [part.edges().sort_by_distance(p)[0] for p in [
        (-26, 0, -18.65),
    ]]
    chamfer6_side_9 = [part.faces().sort_by_distance(p)[0] for p in [
        (-26, 7.5, -18.65),
    ]]
    chamfer6_edges_10 = [part.edges().sort_by_distance(p)[0] for p in [
        (-18, 0, -18.65),
    ]]
    chamfer6_side_10 = [part.faces().sort_by_distance(p)[0] for p in [
        (-18, 7.5, -18.65),
    ]]
    chamfer6 = BRepFilletAPI_MakeChamfer(part.part.solid().wrapped)
    for e in chamfer6_edges_1:
        chamfer6.Add(CHAMFER6_SIZE, CHAMFER6_SIZE2, e.wrapped, chamfer6_side_1[0].wrapped)  # the first distance lies on this face
    for e in chamfer6_edges_2:
        chamfer6.Add(CHAMFER6_SIZE, CHAMFER6_SIZE2, e.wrapped, chamfer6_side_2[0].wrapped)  # the first distance lies on this face
    for e in chamfer6_edges_3:
        chamfer6.Add(CHAMFER6_SIZE, CHAMFER6_SIZE2, e.wrapped, chamfer6_side_3[0].wrapped)  # the first distance lies on this face
    for e in chamfer6_edges_4:
        chamfer6.Add(CHAMFER6_SIZE, CHAMFER6_SIZE2, e.wrapped, chamfer6_side_4[0].wrapped)  # the first distance lies on this face
    for e in chamfer6_edges_5:
        chamfer6.Add(CHAMFER6_SIZE, CHAMFER6_SIZE2, e.wrapped, chamfer6_side_5[0].wrapped)  # the first distance lies on this face
    for e in chamfer6_edges_6:
        chamfer6.Add(CHAMFER6_SIZE, CHAMFER6_SIZE2, e.wrapped, chamfer6_side_6[0].wrapped)  # the first distance lies on this face
    for e in chamfer6_edges_7:
        chamfer6.Add(CHAMFER6_SIZE, CHAMFER6_SIZE2, e.wrapped, chamfer6_side_7[0].wrapped)  # the first distance lies on this face
    for e in chamfer6_edges_8:
        chamfer6.Add(CHAMFER6_SIZE, CHAMFER6_SIZE2, e.wrapped, chamfer6_side_8[0].wrapped)  # the first distance lies on this face
    for e in chamfer6_edges_9:
        chamfer6.Add(CHAMFER6_SIZE, CHAMFER6_SIZE2, e.wrapped, chamfer6_side_9[0].wrapped)  # the first distance lies on this face
    for e in chamfer6_edges_10:
        chamfer6.Add(CHAMFER6_SIZE, CHAMFER6_SIZE2, e.wrapped, chamfer6_side_10[0].wrapped)  # the first distance lies on this face
    add(Compound.cast(chamfer6.Shape()), mode=Mode.REPLACE)


solid = part.part
